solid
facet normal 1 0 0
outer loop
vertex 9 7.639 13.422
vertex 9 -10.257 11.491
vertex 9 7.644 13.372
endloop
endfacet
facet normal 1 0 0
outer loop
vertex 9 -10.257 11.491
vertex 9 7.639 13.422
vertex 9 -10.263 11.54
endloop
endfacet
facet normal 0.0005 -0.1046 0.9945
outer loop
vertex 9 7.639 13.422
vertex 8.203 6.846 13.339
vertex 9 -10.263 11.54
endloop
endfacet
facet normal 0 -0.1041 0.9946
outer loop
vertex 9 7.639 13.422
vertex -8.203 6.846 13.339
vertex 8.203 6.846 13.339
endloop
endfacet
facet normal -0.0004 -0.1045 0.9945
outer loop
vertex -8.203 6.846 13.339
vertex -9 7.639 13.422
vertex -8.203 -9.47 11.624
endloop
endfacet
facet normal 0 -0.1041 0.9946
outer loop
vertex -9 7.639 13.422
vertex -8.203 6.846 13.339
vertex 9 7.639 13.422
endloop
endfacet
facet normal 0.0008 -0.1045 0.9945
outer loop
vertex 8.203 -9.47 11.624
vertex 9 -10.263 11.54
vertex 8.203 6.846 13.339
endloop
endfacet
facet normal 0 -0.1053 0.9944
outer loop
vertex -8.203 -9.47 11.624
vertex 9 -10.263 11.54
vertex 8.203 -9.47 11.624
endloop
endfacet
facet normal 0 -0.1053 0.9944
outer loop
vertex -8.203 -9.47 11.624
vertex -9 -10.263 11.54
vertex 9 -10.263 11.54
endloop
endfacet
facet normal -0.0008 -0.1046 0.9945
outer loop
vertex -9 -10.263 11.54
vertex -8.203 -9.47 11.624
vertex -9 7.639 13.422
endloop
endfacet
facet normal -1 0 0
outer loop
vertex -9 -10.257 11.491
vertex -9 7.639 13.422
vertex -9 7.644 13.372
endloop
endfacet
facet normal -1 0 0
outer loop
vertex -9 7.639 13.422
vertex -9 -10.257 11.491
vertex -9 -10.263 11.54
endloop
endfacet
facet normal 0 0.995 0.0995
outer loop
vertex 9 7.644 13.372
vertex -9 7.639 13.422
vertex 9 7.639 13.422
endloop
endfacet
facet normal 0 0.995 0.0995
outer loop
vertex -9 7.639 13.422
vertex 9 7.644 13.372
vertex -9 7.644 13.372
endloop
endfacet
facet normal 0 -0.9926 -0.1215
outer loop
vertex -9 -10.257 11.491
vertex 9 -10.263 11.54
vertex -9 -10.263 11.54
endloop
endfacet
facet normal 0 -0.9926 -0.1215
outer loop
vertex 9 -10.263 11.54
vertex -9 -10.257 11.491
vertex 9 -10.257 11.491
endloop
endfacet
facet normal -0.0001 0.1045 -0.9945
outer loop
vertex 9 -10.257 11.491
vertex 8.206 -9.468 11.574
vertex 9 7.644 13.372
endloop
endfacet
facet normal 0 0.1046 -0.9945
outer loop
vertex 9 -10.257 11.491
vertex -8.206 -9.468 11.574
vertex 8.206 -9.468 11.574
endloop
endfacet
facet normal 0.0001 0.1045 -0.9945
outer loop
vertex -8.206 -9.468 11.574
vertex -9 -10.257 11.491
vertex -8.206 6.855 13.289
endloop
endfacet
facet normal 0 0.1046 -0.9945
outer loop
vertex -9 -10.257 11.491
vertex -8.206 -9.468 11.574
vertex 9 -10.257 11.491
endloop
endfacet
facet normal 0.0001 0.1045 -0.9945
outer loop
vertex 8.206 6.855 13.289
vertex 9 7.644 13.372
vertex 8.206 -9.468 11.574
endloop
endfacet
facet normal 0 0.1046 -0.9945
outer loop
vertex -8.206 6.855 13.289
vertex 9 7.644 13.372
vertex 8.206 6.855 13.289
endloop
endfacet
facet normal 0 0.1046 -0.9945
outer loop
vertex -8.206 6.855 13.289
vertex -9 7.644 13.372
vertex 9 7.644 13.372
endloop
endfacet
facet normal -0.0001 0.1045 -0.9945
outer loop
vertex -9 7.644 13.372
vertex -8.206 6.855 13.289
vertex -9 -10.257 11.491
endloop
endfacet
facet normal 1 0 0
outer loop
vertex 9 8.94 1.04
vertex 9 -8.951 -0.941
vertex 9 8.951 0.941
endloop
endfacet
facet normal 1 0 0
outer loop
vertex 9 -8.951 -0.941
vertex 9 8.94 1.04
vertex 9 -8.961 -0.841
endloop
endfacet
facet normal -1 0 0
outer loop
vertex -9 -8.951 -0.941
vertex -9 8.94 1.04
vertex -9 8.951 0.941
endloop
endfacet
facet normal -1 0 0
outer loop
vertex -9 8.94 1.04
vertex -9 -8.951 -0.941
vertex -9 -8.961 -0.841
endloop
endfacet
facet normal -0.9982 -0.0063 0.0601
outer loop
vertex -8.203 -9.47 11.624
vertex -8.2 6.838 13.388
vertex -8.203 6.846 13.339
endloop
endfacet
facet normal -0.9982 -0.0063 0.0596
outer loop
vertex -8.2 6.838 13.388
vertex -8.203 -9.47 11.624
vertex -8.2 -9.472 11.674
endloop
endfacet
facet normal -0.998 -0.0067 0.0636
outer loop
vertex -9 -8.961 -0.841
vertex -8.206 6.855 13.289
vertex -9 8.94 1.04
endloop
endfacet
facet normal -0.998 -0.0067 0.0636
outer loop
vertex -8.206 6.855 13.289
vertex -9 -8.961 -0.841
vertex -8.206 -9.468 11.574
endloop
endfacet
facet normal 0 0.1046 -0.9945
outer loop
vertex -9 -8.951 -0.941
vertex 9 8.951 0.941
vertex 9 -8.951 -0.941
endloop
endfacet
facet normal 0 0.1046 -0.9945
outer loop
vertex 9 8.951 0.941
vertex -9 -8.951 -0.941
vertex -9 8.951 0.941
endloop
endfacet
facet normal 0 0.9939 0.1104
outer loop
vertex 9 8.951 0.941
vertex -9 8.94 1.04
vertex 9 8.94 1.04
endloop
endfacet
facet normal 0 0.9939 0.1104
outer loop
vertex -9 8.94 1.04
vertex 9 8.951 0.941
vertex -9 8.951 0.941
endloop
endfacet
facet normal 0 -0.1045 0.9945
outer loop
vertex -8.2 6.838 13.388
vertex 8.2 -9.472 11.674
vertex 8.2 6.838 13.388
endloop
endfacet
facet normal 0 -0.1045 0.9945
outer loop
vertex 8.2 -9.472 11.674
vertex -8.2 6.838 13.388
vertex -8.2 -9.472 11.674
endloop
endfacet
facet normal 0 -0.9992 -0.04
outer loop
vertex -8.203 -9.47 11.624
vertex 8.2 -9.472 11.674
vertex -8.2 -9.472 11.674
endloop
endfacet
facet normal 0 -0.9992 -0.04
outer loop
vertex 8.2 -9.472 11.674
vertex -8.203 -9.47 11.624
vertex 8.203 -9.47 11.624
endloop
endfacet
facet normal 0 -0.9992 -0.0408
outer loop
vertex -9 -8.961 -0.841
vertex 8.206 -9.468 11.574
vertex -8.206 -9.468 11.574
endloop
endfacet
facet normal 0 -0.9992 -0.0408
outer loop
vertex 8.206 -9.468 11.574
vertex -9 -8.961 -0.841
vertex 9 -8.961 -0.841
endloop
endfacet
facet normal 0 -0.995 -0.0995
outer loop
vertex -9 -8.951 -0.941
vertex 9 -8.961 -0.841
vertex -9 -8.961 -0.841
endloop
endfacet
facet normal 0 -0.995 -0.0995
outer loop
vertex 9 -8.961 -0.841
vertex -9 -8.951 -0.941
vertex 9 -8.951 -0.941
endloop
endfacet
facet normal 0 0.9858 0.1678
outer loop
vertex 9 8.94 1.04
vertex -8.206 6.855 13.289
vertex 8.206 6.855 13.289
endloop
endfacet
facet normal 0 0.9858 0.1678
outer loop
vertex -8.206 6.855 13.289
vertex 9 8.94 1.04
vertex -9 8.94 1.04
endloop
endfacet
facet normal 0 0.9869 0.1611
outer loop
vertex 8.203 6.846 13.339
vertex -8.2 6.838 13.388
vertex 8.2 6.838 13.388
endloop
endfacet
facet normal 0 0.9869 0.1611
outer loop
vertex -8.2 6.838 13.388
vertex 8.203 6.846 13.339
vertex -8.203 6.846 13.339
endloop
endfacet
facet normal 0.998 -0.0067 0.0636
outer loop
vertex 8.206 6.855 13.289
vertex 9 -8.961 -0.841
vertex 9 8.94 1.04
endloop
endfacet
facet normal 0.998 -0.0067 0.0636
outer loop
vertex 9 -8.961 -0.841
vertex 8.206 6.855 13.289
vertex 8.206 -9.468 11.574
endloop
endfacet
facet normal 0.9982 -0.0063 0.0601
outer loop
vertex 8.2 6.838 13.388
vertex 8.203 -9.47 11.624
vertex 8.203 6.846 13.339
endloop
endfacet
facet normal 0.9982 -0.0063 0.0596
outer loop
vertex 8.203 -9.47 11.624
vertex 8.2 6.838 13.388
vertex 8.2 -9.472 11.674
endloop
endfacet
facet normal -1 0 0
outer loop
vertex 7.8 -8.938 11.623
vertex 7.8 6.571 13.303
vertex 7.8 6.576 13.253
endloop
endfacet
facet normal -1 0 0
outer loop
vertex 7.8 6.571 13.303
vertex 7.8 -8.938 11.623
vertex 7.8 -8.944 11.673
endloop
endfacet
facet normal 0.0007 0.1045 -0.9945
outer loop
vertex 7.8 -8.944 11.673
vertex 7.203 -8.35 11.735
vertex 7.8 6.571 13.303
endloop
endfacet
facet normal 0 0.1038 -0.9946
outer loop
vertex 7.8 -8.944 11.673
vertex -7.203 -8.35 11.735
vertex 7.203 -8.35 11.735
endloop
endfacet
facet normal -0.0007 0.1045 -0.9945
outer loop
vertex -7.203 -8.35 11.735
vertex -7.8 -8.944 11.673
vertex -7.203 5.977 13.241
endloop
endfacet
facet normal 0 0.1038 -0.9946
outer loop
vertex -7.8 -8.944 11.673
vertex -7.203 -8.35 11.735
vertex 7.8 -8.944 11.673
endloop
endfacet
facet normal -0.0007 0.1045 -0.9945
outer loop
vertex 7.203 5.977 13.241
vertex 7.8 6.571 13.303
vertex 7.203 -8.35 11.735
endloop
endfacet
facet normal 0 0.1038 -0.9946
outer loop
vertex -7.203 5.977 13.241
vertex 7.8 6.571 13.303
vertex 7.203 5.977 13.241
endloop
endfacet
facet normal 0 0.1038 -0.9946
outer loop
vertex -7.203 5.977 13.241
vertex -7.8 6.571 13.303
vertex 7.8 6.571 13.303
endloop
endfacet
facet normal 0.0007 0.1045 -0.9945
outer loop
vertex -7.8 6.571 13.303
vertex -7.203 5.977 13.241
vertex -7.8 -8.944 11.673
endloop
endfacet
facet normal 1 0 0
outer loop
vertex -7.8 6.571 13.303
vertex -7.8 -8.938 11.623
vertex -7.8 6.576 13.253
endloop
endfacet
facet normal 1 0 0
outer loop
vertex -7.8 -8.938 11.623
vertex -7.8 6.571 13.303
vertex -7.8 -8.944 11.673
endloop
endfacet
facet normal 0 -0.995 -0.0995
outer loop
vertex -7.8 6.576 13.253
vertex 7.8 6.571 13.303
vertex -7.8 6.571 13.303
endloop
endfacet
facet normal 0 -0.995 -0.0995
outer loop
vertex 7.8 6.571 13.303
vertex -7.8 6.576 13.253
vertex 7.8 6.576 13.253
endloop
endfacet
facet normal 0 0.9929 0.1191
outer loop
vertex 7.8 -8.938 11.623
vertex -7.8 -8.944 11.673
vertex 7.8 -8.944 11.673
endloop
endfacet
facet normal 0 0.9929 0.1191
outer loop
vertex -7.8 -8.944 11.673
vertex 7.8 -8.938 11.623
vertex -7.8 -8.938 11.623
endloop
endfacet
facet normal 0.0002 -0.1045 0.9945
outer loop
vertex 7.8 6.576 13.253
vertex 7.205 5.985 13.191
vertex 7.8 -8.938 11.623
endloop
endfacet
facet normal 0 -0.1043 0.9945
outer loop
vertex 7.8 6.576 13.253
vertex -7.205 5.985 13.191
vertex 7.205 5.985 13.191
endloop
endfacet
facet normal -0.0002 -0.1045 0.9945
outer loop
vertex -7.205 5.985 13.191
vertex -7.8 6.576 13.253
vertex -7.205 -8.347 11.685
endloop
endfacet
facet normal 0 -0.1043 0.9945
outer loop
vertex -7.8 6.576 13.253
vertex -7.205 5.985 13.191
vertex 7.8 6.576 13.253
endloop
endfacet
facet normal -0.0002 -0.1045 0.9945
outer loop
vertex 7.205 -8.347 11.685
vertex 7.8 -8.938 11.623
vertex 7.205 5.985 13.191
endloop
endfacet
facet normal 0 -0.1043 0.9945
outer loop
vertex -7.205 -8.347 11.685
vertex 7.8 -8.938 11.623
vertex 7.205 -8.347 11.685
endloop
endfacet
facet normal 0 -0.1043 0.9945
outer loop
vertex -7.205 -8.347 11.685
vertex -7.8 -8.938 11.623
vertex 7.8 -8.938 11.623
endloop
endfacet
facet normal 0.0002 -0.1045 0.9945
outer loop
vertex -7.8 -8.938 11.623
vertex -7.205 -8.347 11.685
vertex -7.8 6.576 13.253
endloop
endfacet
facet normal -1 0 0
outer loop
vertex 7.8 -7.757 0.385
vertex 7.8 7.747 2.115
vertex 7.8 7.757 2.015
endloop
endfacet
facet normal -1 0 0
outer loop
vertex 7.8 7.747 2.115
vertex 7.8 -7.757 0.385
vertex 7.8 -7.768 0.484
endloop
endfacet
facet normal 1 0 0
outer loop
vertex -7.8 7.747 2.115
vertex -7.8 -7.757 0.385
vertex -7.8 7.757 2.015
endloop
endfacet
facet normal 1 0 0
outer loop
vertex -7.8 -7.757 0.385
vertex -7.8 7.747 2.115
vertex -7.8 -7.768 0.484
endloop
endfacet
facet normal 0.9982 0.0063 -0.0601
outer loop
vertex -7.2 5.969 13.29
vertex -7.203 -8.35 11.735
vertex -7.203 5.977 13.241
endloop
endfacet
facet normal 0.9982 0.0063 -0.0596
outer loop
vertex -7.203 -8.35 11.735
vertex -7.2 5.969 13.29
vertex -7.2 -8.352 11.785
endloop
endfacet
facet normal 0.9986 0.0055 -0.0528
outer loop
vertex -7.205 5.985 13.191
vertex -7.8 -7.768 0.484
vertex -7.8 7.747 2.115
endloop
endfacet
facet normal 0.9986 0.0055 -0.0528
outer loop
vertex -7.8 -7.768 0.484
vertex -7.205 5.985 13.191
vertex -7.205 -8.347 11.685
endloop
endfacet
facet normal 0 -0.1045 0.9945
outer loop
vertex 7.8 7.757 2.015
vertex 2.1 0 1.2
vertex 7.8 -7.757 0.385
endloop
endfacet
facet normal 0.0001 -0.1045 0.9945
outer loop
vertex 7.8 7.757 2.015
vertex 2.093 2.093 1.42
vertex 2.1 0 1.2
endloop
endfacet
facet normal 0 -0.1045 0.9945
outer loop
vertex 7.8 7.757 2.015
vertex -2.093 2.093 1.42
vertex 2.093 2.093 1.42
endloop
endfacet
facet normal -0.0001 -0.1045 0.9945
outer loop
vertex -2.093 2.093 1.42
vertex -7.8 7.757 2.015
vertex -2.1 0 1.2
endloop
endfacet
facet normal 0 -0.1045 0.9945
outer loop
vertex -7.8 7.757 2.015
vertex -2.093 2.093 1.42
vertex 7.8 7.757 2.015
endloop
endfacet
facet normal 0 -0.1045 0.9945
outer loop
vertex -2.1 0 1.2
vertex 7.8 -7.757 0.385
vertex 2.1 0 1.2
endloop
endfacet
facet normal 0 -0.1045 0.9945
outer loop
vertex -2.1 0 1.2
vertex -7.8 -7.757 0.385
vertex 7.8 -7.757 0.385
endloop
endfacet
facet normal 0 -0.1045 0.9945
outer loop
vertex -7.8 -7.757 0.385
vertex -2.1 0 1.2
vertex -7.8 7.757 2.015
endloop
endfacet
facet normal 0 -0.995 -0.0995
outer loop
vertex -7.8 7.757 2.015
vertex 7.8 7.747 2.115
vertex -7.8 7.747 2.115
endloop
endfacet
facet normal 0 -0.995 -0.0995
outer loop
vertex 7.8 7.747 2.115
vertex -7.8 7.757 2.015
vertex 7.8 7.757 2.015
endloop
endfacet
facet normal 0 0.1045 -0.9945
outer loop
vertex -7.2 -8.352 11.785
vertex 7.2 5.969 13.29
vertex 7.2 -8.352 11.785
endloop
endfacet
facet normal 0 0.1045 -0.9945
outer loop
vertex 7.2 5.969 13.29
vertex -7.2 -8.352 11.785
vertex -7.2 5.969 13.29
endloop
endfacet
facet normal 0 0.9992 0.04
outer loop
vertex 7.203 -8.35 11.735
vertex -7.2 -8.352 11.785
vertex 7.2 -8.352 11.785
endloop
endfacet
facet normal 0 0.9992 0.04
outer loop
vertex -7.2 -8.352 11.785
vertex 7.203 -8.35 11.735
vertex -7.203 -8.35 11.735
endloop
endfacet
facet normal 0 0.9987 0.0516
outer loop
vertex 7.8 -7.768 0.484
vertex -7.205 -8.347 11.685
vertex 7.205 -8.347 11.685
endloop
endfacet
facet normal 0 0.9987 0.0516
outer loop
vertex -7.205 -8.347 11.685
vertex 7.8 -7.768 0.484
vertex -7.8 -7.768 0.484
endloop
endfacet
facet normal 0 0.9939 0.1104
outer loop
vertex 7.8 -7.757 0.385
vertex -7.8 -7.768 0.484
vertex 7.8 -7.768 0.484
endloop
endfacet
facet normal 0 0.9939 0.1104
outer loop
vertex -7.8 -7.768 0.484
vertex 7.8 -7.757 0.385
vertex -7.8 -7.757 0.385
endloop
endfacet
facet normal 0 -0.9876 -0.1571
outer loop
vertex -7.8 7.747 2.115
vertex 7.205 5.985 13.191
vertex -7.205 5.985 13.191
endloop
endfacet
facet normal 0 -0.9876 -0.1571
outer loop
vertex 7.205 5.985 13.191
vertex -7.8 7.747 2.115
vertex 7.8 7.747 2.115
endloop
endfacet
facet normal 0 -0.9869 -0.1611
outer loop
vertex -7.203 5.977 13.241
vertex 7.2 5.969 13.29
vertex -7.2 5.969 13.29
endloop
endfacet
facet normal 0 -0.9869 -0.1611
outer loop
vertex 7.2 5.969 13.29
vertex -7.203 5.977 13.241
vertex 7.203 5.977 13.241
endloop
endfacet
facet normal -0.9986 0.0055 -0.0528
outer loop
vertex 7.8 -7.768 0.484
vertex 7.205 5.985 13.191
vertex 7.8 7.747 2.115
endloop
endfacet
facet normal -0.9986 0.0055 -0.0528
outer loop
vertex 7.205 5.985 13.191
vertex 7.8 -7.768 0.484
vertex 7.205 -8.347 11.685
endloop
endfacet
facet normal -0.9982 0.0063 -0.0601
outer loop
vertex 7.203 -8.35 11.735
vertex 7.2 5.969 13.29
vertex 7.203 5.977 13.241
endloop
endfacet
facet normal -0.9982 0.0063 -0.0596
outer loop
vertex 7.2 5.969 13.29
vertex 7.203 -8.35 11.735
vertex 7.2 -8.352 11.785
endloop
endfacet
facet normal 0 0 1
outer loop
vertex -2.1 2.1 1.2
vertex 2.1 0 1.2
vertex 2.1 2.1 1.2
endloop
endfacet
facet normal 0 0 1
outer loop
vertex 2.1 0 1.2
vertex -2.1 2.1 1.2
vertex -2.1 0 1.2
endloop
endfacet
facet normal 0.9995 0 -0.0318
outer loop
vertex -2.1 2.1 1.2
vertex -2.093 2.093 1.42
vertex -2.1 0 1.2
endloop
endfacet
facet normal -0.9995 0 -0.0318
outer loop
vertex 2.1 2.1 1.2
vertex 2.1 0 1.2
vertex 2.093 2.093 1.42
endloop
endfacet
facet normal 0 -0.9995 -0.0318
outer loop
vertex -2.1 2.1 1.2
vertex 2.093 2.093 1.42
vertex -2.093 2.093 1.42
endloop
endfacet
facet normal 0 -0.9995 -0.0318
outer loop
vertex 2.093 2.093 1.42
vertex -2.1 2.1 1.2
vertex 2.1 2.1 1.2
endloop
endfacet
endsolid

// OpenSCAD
//////////////////////////////////////////////////////////////
// Alps SKCC Keycap (TRS-80 Model I style)
// Fully standalone, produces a real keycap shape
//////////////////////////////////////////////////////////////

// === MAIN ENTRY ===
keycap_skcc();

module keycap_skcc(
    w = 18,          // width (1u)
    d = 18,          // depth
    h = 12.5,        // height
    wall = 1.2,      // shell thickness
    dish_depth = 1,  // top dish depth
    row_angle = 6,   // tilt
    stem_depth = 6   // SKCC socket depth
) {
    difference() {
        // Outer cap
        keycap_outer(w, d, h, row_angle, dish_depth);

        // Hollow interior
        translate([0,0,wall])
            keycap_inner(w, d, h, wall, row_angle, dish_depth);

        // SKCC square stem socket
        translate([0,0,wall])
            skcc_socket(stem_depth);
    }
}

//////////////////////////////////////////////////////////////
// OUTER SHAPE WITH TAPER + DISH
//////////////////////////////////////////////////////////////
module keycap_outer(w, d, h, angle, dish) {
    rotate([angle,0,0])
    union() {
        // Tapered block
        hull() {
            translate([-w/2, -d/2, 0])
                cube([w, d, 0.1]);

            translate([-w/2+0.8, -d/2+0.8, h])
                cube([w-1.6, d-1.6, 0.1]);
        }

        // Dish
        translate([0,0,h])
            keycap_dish(w, d, dish);
    }
}

//////////////////////////////////////////////////////////////
// INNER SHAPE (HOLLOW)
//////////////////////////////////////////////////////////////
module keycap_inner(w, d, h, wall, angle, dish) {
    rotate([angle,0,0])
    union() {
        hull() {
            translate([-(w-2*wall)/2, -(d-2*wall)/2, 0])
                cube([w-2*wall, d-2*wall, 0.1]);

            translate([-(w-2*wall)/2+0.6, -(d-2*wall)/2+0.6, h-wall])
                cube([w-2*wall-1.2, d-2*wall-1.2, 0.1]);
        }

        // Inner dish cut
        translate([0,0,h-wall])
            keycap_dish(w-2*wall, d-2*wall, dish);
    }
}

//////////////////////////////////////////////////////////////
// TOP DISH (CYLINDRICAL)
//////////////////////////////////////////////////////////////
module keycap_dish(w, d, depth) {
    difference() {
        cube([w, d, 0.1], center=true);
        translate([0,0,-depth])
            cylinder(r=max(w,d), h=depth, $fn=80);
    }
}

//////////////////////////////////////////////////////////////
// SKCC STEM SOCKET (SQUARE, TAPERED)
//////////////////////////////////////////////////////////////
module skcc_socket(depth) {
    socket_top = 4.2;
    socket_bottom = 3.8;

    // Tapered square socket
    linear_extrude(height = depth, scale = socket_bottom/socket_top)
        square([socket_top, socket_top], center=true);
}
